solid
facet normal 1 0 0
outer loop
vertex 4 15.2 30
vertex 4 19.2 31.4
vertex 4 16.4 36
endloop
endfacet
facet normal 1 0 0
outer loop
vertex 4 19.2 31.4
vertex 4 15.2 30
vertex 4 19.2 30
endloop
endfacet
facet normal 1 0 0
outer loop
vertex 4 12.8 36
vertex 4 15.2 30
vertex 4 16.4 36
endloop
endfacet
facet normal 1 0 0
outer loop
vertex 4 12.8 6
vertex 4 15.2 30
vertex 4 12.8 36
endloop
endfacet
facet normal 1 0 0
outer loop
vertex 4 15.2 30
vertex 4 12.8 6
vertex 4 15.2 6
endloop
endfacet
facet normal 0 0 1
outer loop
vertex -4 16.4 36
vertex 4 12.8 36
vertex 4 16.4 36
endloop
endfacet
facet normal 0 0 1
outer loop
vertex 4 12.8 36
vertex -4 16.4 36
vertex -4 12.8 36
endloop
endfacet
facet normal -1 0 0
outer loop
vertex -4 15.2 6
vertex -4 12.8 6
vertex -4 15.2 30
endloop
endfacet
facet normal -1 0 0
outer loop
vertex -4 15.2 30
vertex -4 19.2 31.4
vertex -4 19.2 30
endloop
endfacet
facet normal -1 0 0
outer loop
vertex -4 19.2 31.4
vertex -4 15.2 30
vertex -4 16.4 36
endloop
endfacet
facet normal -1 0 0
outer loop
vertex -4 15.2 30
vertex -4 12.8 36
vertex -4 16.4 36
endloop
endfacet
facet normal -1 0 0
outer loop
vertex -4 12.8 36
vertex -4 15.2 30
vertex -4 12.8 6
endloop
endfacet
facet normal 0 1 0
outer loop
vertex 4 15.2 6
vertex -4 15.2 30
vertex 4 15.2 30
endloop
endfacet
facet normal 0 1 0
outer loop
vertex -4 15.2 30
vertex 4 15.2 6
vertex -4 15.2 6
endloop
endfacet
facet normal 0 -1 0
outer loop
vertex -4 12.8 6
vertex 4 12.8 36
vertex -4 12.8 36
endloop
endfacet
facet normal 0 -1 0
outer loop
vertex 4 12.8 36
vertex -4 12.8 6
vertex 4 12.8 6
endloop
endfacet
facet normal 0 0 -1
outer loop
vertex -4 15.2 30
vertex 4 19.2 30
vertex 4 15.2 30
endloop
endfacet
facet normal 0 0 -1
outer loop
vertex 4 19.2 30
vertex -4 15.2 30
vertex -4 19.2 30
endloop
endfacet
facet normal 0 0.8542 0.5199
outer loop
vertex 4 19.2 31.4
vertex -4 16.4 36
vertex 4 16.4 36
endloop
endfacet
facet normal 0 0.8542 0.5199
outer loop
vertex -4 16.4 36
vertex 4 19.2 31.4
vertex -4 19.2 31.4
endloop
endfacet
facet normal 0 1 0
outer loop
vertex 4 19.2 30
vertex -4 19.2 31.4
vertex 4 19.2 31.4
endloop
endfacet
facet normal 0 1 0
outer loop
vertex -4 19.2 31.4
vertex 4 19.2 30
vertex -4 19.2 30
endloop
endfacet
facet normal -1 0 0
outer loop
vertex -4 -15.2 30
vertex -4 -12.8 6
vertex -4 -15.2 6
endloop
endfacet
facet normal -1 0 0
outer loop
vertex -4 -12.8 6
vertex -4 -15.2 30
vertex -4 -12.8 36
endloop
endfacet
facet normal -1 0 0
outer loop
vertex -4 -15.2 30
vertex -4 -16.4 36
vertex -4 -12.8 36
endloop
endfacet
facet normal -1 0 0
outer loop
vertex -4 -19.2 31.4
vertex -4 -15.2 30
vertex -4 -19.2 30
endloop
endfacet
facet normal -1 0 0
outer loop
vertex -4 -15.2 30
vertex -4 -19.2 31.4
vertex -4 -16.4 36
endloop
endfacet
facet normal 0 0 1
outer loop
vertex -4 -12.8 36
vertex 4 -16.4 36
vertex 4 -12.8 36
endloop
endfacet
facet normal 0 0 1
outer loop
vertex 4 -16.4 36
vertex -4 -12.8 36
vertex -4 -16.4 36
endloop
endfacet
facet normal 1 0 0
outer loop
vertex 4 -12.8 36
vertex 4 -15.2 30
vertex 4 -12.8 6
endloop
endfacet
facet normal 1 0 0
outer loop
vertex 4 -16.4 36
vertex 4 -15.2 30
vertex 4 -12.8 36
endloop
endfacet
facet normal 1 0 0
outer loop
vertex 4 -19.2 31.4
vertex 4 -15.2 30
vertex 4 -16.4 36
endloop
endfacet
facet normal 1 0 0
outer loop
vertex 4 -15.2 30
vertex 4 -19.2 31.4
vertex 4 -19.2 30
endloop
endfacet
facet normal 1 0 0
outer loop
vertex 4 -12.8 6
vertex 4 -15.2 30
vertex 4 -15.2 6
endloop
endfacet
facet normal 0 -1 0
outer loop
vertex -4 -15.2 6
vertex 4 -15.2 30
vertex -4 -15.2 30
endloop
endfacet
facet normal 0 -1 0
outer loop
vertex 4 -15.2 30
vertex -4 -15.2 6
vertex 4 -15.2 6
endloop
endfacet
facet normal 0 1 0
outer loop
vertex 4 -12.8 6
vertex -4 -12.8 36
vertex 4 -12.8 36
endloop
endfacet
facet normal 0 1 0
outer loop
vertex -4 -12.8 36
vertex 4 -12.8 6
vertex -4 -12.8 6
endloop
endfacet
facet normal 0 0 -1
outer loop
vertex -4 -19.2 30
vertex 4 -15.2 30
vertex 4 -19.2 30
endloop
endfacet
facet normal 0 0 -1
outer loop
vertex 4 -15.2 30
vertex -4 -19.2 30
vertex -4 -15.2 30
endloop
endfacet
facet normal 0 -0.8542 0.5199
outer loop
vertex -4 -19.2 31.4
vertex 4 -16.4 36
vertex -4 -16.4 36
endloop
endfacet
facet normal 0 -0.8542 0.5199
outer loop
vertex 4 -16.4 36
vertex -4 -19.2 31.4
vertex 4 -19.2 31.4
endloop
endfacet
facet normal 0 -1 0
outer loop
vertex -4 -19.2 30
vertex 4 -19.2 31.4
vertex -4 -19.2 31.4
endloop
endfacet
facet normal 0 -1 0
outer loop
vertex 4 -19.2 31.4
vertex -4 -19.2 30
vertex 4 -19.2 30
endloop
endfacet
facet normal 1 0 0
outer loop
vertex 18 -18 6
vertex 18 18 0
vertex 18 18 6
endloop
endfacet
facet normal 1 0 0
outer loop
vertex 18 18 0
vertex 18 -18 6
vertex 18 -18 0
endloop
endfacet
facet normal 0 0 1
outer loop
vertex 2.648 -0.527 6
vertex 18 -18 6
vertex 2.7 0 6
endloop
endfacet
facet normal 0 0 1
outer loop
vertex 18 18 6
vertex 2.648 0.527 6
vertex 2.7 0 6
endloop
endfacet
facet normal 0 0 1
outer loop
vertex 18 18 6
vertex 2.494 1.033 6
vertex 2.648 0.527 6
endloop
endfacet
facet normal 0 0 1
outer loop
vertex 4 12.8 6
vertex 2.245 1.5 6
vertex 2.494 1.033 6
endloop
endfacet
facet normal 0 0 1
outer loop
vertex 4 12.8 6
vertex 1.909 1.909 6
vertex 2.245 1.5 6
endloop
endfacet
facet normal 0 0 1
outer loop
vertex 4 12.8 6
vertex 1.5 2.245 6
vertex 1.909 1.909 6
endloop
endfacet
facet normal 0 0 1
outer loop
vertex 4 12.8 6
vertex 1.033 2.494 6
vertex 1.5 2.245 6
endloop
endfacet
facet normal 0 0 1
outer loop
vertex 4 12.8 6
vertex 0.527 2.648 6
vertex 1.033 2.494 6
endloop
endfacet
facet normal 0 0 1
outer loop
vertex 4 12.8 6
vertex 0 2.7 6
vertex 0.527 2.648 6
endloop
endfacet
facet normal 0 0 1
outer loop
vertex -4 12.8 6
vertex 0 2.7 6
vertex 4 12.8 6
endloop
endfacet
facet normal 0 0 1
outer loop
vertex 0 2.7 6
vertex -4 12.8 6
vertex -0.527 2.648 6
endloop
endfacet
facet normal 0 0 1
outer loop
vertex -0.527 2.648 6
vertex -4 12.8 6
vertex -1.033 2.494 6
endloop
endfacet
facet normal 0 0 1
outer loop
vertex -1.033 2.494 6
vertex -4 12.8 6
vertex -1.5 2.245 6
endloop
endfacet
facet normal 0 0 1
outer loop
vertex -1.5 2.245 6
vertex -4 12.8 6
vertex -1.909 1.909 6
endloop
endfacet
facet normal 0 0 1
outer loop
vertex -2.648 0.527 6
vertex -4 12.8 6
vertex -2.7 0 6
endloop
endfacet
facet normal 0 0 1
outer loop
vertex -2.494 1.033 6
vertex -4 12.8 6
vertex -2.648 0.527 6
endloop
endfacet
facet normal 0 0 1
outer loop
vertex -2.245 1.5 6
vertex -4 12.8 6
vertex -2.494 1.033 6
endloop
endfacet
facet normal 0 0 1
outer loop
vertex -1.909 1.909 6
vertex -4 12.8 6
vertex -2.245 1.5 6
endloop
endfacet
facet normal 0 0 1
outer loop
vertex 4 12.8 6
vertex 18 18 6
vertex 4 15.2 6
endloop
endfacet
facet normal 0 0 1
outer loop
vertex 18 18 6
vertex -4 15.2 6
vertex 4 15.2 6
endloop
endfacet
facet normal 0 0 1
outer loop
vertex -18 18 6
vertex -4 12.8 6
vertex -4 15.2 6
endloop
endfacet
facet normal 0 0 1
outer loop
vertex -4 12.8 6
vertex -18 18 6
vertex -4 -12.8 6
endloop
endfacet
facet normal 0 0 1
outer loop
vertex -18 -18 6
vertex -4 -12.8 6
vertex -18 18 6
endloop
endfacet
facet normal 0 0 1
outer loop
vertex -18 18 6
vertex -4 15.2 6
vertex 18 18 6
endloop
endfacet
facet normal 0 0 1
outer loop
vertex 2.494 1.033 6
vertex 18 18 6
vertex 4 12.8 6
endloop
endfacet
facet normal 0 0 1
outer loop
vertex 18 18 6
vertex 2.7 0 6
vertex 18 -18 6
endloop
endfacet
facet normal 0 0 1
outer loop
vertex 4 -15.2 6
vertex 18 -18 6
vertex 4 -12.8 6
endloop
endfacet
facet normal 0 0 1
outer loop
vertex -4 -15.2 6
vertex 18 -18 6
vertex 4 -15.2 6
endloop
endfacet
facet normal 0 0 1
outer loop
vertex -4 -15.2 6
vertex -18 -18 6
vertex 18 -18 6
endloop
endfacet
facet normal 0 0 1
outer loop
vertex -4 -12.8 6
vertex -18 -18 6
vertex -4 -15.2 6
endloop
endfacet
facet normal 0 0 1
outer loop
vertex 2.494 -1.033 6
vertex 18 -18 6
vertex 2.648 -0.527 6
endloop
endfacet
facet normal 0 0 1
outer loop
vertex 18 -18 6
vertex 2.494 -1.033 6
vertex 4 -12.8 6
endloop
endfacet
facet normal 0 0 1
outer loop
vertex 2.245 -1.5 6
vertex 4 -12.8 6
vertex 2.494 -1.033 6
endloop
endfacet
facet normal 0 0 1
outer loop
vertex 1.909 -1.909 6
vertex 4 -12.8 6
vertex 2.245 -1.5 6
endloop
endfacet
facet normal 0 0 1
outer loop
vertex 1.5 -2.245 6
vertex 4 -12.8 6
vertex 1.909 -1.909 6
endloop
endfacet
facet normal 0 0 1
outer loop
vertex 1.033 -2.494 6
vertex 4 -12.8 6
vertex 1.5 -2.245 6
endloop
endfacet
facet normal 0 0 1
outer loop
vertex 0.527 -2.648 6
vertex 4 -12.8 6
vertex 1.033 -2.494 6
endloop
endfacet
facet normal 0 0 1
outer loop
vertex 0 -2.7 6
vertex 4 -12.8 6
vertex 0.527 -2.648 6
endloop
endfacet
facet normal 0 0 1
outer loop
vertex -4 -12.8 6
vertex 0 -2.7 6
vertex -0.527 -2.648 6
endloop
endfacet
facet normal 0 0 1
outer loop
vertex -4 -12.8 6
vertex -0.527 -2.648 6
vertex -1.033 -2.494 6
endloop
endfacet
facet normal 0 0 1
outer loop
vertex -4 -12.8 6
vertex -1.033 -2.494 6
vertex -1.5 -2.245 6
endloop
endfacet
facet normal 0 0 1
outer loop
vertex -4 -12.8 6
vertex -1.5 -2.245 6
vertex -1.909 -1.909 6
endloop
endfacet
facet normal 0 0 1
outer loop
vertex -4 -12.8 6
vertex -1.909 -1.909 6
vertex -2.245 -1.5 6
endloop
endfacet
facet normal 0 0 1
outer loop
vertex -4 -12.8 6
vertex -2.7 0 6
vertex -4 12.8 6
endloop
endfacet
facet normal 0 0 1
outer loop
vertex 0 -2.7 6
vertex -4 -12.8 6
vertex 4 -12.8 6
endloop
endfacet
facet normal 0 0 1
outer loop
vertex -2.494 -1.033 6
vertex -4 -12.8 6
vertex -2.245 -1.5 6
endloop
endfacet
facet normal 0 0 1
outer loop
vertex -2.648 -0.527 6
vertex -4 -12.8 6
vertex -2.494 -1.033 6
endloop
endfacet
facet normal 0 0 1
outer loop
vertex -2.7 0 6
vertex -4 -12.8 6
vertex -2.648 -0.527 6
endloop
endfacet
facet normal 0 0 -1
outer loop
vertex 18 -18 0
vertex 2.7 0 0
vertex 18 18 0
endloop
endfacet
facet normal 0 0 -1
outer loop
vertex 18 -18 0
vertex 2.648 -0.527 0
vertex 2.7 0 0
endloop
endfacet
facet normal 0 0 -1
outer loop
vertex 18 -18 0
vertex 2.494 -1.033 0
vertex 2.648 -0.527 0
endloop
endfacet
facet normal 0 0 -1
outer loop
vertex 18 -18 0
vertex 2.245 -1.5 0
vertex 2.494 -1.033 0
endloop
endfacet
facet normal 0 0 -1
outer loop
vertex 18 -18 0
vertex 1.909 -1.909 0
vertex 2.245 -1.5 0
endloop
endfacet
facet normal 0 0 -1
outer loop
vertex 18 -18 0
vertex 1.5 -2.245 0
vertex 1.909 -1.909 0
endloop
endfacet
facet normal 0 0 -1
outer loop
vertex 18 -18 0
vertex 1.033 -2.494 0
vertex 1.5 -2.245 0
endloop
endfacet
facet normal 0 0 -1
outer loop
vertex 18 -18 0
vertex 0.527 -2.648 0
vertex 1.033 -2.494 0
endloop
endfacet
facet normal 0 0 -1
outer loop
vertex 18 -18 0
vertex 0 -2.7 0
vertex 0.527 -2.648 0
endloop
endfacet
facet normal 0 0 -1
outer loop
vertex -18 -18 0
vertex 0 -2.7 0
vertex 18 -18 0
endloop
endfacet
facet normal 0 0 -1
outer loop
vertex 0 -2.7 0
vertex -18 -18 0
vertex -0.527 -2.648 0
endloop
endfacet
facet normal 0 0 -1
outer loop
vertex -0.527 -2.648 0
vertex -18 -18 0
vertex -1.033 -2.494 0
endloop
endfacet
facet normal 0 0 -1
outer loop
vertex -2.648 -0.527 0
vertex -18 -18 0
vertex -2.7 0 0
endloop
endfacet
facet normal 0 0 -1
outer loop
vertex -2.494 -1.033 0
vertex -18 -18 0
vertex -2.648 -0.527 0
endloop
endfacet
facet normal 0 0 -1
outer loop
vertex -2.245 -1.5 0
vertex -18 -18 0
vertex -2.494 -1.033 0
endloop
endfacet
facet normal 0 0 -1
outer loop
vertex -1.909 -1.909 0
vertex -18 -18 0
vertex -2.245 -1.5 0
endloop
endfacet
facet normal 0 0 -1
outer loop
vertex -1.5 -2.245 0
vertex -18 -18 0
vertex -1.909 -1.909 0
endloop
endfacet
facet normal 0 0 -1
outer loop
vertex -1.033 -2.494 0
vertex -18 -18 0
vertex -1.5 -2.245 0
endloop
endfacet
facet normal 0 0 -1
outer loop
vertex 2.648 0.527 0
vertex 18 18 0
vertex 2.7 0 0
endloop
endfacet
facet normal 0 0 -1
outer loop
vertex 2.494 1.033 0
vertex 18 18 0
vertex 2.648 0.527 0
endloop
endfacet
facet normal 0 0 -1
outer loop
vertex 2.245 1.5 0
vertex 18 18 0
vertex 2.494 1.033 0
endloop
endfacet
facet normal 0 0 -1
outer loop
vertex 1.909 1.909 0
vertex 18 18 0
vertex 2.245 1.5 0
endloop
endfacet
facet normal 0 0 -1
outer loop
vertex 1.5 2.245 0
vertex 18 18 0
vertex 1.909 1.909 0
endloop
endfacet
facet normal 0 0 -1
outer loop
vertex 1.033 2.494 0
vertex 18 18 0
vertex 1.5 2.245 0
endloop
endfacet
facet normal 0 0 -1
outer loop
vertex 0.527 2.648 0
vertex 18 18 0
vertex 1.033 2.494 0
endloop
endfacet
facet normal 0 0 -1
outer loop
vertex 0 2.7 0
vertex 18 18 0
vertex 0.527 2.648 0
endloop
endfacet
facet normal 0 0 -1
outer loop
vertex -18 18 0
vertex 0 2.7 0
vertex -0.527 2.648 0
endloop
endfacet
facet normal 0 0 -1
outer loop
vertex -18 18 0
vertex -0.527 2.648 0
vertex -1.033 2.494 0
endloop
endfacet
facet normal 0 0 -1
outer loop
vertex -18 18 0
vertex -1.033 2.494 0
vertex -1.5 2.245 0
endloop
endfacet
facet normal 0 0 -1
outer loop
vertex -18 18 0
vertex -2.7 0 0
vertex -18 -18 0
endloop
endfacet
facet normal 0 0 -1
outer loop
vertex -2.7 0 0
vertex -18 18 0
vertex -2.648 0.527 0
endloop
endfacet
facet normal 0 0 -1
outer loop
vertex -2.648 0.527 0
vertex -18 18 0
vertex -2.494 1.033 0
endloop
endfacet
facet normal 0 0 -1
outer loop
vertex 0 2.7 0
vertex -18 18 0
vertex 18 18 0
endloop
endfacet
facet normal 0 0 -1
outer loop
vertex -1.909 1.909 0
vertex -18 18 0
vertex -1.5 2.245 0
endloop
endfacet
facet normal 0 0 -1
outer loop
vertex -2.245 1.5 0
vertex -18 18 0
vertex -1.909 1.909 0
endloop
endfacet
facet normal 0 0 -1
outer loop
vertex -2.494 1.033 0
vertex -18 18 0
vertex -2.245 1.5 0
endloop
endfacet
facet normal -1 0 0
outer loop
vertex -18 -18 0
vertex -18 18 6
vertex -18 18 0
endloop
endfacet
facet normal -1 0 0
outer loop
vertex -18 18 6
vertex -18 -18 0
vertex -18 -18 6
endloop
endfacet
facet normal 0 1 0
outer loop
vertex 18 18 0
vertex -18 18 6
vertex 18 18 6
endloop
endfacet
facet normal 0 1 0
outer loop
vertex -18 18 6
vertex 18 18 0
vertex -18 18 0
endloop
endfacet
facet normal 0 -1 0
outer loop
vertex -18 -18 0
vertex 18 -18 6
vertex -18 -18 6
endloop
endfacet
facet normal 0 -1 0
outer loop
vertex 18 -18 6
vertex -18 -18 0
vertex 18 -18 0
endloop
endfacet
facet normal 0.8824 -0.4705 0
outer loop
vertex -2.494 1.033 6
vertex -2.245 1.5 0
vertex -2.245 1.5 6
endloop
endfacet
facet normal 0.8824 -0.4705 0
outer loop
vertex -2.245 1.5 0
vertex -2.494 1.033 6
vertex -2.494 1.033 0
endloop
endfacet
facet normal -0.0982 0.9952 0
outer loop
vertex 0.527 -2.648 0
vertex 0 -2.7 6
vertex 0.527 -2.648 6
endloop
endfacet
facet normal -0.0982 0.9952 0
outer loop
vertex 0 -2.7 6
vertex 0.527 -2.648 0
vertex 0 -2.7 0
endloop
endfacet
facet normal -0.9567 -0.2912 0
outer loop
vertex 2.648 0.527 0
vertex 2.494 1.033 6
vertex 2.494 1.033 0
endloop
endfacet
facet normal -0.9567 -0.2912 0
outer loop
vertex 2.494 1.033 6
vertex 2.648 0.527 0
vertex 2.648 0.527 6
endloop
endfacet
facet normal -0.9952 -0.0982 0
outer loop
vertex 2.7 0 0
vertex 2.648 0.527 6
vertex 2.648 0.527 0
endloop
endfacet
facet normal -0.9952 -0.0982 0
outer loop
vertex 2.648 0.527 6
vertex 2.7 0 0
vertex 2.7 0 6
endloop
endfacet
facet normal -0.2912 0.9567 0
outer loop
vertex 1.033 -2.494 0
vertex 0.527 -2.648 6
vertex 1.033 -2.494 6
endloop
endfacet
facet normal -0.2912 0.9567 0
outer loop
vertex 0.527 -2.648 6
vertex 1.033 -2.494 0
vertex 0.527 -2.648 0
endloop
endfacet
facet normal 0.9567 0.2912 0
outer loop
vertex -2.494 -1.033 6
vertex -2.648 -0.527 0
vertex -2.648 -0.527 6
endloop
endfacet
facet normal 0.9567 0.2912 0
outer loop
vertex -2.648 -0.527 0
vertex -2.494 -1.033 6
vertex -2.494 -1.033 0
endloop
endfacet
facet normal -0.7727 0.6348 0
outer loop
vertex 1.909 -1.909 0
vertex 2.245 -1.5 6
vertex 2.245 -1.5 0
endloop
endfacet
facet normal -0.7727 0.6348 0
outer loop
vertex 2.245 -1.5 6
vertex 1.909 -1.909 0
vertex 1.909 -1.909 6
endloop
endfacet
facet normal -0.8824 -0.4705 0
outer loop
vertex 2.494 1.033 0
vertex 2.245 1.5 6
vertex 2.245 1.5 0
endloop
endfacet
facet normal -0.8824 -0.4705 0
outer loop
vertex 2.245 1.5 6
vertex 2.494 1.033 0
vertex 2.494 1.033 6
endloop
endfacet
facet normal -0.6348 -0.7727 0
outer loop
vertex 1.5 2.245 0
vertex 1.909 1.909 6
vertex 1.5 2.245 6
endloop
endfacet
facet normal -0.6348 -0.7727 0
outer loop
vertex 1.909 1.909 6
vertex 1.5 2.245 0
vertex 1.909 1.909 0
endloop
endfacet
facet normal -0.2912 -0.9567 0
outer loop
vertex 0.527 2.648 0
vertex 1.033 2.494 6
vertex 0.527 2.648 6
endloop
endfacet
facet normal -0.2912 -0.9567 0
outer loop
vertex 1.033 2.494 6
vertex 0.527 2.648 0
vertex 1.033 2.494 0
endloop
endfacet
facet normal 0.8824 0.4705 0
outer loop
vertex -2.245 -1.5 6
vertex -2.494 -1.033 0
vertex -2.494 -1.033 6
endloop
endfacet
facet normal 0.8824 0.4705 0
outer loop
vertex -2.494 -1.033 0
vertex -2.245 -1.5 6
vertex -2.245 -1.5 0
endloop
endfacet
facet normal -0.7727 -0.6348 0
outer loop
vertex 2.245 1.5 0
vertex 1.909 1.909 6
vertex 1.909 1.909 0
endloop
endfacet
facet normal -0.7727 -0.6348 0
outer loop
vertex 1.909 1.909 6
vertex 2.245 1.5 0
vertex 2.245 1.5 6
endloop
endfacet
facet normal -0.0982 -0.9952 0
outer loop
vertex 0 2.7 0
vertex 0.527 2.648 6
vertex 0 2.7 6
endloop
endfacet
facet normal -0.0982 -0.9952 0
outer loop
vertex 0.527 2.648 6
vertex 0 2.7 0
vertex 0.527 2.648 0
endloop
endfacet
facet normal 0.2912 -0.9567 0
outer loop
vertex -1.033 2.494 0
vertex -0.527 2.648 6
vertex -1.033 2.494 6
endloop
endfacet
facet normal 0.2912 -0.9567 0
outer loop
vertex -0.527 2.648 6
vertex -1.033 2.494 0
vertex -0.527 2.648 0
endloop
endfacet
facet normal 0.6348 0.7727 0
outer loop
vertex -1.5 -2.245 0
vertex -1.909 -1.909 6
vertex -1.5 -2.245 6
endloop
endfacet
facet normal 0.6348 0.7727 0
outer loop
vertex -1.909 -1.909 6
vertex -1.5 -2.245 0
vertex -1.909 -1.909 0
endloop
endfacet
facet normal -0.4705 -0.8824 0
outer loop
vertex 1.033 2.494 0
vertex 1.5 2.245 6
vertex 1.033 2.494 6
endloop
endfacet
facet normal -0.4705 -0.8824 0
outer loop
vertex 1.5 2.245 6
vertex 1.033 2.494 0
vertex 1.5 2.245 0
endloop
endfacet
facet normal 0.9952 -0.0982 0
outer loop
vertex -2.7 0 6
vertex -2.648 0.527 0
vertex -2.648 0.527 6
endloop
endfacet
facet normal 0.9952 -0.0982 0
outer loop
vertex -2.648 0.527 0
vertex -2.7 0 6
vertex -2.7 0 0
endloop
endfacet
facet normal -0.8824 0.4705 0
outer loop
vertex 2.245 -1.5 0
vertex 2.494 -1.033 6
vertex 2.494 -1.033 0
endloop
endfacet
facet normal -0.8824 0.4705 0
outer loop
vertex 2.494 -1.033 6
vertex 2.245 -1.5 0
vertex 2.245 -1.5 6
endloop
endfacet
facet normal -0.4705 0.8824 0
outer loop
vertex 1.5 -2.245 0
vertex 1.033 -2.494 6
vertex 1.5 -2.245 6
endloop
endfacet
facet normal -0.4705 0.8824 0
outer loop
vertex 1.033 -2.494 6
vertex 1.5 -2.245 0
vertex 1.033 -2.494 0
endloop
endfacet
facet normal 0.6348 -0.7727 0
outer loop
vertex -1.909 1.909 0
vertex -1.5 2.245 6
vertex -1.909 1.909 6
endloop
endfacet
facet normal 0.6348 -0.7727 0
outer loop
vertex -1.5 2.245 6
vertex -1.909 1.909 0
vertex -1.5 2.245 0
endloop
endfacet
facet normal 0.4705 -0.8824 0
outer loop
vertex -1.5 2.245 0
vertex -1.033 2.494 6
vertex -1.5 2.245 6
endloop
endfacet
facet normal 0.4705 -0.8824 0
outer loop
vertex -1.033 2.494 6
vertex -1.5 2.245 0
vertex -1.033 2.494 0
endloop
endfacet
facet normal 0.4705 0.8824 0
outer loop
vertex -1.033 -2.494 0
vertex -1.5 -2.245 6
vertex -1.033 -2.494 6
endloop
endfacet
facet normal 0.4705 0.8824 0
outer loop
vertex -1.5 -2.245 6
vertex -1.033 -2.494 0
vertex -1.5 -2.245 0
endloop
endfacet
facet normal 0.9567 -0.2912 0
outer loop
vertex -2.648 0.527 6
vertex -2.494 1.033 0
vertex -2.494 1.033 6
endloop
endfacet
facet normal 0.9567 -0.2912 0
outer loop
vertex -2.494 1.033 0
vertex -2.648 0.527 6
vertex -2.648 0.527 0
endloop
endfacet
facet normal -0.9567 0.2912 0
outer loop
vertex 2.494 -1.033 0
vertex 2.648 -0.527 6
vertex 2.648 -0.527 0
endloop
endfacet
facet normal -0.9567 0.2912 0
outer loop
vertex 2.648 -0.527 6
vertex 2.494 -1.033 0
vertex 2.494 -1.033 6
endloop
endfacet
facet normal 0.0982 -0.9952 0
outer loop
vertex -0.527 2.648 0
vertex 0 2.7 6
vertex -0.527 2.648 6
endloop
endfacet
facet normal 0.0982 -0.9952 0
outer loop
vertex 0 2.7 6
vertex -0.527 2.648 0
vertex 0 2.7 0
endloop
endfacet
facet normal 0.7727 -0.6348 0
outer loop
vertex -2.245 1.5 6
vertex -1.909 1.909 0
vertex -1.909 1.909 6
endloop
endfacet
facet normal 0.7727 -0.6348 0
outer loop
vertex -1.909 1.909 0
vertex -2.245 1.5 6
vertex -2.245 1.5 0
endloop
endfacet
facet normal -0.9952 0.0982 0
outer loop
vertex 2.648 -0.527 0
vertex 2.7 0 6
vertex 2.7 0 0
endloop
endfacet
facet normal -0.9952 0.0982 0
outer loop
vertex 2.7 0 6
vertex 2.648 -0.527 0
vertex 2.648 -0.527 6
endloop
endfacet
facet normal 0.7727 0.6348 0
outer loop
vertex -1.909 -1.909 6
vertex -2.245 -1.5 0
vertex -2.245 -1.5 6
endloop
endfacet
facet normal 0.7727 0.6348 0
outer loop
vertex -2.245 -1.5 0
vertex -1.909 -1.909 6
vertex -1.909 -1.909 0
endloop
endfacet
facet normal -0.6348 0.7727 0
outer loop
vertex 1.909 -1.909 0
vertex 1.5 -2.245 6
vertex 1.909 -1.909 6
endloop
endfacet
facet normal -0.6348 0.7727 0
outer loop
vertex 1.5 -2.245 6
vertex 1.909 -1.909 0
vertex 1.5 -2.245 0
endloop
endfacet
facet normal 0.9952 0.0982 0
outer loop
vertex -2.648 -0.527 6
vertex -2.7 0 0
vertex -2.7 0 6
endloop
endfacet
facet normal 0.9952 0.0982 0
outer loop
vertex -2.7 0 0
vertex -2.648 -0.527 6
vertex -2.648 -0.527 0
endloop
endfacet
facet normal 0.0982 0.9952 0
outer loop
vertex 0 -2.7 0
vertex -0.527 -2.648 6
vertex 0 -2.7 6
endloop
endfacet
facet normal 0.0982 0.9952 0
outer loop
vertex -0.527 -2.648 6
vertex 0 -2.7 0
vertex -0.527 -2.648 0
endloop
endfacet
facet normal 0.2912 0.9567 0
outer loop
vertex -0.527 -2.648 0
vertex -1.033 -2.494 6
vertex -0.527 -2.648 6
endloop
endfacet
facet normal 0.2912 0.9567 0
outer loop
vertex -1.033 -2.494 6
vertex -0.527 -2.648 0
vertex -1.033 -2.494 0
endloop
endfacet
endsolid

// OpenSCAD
$fn = 32;

// ----------------------------------------------------------------------
// Snap-fit latch: 2 arms, 30 mm tall, 4.2 mm undercut hooks
// ----------------------------------------------------------------------

// --- parameters (mm) ---
base_d = 36;              // base plate depth
base_h = 6;               // base plate thickness
span = 28;                // distance between opposite arms
arm_t = 2.4;              // arm thickness
arm_d = 8;                // arm width
height = 30;              // free arm length
head_len = 4.2;           // hook reach
head_h = 6;               // hook height
lead = 1.4;               // lead-in ramp thickness
bore_d = 5.4;             // base fixing bore
top_z = 36;               // height of the arm tips above the base

arms = 2;

difference() {
  union() {
    /* base plate, centred on the arm ring */
    translate([-18, -18, 0]) cube([base_d, base_d, base_h]);
    for (a = [0 : 360 / arms : 359]) rotate([0, 0, a]) {
    /* arm, sunk 0.5 mm into the base */
    translate([-arm_d / 2, span / 2 - arm_t / 2, base_h - 0.5]) cube([arm_d, arm_t, height + 0.5]);
    /* hook: a convex hull of a tall inner block and a thin outer lip
       gives a flat undercut below and a lead-in ramp on top */
    hull() {
      translate([-arm_d / 2, span / 2 + arm_t / 2 - 0.6, top_z - head_h]) cube([arm_d, lead + 0.4, head_h]);
      translate([-arm_d / 2, span / 2 + arm_t / 2 - 0.2, top_z - head_h]) cube([arm_d, head_len, lead]);
    }
    }
  }
  translate([0, 0, -2.5]) cylinder(h = base_h + 5, d = bore_d);
}
